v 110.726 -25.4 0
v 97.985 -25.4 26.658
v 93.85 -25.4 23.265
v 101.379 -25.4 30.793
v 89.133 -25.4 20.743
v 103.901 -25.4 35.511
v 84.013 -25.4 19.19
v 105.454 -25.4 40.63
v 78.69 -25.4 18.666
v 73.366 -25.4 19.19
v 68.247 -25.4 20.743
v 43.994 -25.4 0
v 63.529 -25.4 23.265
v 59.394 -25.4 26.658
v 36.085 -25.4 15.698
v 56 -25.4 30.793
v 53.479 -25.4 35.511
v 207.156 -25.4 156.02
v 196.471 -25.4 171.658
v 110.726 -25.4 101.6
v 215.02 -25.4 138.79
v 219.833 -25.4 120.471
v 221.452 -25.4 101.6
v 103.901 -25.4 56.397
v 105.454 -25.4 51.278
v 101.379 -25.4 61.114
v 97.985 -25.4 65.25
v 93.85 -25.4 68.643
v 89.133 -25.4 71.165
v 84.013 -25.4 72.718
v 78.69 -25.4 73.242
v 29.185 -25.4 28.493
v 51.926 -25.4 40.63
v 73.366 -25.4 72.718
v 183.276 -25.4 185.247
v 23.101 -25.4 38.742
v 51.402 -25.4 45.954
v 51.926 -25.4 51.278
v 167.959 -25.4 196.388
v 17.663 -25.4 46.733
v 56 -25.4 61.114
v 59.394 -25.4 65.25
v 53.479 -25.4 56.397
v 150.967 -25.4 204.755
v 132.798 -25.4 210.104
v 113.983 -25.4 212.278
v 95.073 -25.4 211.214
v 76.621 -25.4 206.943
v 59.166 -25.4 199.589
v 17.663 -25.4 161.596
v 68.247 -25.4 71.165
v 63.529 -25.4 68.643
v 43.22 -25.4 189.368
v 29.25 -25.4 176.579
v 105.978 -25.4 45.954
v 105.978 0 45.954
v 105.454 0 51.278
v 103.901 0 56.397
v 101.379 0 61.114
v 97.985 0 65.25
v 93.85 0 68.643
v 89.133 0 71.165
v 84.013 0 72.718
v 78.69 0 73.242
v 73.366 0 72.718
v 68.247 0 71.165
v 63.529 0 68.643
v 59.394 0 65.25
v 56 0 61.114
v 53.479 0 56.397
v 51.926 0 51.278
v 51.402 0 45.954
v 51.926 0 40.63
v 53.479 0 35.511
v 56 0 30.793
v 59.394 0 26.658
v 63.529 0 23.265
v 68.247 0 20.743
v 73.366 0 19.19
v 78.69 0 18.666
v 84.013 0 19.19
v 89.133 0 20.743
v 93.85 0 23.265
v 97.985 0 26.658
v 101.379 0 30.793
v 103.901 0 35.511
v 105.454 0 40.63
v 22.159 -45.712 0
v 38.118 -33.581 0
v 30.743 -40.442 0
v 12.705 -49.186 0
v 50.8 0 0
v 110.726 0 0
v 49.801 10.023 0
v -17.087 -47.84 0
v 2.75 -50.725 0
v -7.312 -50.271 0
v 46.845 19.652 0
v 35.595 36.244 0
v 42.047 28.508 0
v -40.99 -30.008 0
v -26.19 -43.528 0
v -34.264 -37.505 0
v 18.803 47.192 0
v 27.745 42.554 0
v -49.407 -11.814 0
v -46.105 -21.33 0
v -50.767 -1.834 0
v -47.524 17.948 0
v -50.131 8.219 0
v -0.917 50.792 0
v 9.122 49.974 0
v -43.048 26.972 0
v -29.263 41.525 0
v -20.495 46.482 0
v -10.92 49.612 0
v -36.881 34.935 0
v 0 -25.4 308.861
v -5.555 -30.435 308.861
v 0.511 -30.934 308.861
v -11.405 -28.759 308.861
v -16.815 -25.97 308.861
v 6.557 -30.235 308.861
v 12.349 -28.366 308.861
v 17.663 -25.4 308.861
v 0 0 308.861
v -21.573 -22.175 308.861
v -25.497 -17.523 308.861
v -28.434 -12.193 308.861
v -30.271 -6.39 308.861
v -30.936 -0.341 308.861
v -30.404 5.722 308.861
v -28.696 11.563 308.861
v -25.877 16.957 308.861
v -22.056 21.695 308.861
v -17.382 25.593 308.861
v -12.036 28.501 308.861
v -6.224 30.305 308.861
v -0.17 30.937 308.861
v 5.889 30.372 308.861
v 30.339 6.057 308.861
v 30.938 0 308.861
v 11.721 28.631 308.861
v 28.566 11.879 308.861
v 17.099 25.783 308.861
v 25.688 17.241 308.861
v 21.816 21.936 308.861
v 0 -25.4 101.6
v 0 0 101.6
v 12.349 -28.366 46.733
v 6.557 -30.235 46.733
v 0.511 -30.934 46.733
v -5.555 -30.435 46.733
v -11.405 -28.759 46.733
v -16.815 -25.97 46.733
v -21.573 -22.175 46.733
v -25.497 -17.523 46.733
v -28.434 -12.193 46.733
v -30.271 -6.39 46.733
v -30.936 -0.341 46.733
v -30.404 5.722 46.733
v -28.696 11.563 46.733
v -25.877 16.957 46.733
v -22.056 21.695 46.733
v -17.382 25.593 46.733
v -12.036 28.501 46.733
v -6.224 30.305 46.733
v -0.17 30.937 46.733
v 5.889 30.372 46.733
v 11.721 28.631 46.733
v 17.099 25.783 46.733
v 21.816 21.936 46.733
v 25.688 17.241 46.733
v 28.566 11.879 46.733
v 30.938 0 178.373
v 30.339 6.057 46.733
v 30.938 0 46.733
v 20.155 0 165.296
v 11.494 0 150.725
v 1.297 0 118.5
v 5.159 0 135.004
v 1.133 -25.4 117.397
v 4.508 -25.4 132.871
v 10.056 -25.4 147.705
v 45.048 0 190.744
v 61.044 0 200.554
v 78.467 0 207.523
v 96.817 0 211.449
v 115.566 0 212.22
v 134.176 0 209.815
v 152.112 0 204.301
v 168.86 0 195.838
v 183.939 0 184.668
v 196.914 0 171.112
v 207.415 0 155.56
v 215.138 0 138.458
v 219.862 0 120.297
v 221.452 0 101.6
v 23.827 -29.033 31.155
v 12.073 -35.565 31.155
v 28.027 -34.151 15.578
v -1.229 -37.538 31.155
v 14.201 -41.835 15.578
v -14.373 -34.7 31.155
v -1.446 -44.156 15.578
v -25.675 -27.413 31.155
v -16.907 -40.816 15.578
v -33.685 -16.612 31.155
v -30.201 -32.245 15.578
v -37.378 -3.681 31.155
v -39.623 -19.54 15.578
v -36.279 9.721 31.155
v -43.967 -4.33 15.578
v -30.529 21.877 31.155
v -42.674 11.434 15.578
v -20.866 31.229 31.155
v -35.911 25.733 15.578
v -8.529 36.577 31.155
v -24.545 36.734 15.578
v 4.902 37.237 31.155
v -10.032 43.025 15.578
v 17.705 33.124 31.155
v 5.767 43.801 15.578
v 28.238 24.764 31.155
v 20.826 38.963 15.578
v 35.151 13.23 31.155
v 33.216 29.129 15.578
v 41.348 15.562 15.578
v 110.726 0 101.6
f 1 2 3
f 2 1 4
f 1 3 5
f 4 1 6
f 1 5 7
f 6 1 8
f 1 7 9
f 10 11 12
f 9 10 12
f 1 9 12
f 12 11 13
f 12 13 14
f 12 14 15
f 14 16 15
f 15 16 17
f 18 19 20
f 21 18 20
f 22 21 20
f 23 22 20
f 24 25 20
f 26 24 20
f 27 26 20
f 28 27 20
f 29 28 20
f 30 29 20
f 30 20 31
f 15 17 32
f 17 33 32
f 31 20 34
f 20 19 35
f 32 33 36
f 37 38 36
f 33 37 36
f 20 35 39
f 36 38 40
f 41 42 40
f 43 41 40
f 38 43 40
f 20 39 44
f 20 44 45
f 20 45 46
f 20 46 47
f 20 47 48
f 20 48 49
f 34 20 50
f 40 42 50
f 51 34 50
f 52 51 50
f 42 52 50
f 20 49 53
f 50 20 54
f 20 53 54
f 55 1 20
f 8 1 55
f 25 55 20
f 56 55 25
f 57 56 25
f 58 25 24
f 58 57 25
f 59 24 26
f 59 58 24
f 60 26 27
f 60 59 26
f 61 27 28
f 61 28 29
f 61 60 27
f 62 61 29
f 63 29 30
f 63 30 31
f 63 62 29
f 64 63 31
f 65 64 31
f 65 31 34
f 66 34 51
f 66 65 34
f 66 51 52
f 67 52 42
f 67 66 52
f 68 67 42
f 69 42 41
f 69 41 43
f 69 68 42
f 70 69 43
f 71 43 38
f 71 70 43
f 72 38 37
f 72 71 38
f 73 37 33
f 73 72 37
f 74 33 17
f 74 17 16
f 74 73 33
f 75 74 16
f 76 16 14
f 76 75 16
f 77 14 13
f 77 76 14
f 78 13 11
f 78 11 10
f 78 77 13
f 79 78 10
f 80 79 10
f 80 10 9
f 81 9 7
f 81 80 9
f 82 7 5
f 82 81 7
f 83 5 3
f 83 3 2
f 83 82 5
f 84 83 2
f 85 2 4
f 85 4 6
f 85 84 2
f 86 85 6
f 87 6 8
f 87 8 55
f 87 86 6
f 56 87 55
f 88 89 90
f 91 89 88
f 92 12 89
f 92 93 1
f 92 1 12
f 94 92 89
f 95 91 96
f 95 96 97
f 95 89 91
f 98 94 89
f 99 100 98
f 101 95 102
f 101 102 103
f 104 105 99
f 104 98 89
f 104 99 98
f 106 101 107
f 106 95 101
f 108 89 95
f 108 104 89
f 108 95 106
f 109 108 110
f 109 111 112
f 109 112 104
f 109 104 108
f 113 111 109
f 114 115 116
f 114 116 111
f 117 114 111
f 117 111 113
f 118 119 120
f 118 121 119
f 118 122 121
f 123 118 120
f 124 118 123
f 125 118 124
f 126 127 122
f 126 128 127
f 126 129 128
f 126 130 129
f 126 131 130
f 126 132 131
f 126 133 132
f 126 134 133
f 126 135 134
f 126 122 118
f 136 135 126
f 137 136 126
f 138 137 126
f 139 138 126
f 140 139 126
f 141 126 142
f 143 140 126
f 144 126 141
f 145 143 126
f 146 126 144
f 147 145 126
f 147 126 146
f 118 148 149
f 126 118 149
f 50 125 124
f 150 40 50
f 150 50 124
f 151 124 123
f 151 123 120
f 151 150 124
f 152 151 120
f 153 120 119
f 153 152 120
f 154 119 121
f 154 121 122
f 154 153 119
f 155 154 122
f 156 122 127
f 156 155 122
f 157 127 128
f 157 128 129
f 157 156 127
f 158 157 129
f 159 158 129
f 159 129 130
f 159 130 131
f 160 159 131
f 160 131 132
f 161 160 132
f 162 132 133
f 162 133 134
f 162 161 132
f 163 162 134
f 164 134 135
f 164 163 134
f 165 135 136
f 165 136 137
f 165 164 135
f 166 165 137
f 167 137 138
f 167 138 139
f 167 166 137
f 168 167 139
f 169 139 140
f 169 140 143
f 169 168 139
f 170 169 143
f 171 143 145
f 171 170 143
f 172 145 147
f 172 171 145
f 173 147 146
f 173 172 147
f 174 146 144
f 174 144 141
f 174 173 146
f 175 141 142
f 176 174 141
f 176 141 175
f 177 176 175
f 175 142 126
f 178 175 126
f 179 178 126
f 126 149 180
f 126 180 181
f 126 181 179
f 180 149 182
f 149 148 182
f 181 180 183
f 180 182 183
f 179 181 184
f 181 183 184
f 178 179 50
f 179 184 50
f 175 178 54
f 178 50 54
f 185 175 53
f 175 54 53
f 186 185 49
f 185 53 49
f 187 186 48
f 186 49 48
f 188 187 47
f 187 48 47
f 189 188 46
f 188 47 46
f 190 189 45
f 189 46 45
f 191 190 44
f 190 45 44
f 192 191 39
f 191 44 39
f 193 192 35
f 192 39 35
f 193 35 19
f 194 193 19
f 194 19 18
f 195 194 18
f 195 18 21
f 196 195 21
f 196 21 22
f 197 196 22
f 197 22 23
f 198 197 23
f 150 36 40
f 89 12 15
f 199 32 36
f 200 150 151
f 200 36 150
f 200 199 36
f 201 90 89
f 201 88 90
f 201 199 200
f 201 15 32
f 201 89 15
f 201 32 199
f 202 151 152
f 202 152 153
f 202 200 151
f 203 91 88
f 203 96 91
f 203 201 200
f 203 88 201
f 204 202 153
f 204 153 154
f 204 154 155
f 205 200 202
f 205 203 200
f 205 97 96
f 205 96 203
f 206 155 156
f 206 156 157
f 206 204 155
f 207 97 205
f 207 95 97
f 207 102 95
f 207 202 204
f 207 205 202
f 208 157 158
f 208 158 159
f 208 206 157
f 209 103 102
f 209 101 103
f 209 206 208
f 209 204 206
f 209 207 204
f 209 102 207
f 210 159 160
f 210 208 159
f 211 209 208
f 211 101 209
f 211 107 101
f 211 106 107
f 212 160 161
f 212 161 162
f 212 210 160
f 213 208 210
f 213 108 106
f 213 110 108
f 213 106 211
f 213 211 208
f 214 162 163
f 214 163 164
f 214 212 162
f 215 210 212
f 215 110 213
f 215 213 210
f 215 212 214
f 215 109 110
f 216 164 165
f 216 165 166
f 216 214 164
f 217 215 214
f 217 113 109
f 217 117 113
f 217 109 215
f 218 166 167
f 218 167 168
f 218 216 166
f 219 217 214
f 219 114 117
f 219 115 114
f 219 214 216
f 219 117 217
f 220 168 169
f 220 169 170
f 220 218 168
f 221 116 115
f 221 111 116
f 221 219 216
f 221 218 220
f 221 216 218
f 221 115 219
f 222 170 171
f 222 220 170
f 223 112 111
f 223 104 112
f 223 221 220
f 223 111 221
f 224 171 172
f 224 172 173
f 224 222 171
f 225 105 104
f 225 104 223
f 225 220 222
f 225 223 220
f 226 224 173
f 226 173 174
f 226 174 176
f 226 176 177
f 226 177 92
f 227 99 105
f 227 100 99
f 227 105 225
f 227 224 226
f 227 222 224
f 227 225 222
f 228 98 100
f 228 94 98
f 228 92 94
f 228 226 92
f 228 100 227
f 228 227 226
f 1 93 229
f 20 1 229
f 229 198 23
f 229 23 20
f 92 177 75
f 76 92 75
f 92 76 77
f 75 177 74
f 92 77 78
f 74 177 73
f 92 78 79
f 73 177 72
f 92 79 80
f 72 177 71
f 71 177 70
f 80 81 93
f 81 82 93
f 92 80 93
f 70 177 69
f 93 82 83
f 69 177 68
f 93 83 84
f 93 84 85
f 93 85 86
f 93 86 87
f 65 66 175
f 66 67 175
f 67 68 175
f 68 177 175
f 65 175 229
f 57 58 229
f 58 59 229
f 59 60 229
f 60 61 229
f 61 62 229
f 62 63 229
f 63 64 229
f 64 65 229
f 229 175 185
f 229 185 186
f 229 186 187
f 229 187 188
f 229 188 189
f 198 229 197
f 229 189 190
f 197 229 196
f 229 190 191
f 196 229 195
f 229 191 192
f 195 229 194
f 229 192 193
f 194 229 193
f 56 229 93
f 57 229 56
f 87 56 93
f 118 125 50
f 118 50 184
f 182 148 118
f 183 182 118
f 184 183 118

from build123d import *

# Parameters (mm, degrees)
F0_W     = 110.7262298465
F0_H     = 101.6
F0_R     = 27.2882199073
F1_DEPTH = 25.4
F4_DEPTH = 262.128
F5_ANGLE = 180


with BuildPart() as f1:
    # F0 (on Front) → F1 (new body)
    with BuildSketch(Plane.XZ):
        with Locations((55.3631149232, 50.8)):
            Rectangle(F0_W, F0_H)
        with Locations((78.689802438, 45.9539219737)):
            Circle(F0_R, mode=Mode.SUBTRACT)
    extrude(amount=F1_DEPTH)

    # F2 (on Front) → F3 (revolve)
    with BuildSketch(Plane.XZ):
        Polygon((-50.8, 0), (0, 0), (0, 46.7330427111), (-30.9378135865, 46.7330427111), align=None)
    revolve(axis=Axis((0, 0, 23.3665213556), (0, 0, -1)))

    # F4 (add): a face of the model
    f4_faces = [f1.faces().sort_by_distance(p)[0] for p in [
        (-4.0593514792, 3.4603008855, 46.7330427111),
    ]]
    extrude(f4_faces, amount=F4_DEPTH)

    # F1_face (on face) → F5 (revolve)
    with BuildSketch(Plane(origin=(55.3631149232, -12.7, 101.6), x_dir=(1, 0, 0), z_dir=(0, 0, 1))):
        Polygon((55.3631149232, -12.7), (55.3631149232, 12.7), (-24.4253013368, 12.7), (-55.3631149232, 12.7), (-55.3631149232, -12.7), (-37.6999241155, -12.7), align=None)
    revolve(axis=Axis((110.7262298465, -12.7, 101.6), (0, 1, 0)), revolution_arc=F5_ANGLE)


solid = f1.part
